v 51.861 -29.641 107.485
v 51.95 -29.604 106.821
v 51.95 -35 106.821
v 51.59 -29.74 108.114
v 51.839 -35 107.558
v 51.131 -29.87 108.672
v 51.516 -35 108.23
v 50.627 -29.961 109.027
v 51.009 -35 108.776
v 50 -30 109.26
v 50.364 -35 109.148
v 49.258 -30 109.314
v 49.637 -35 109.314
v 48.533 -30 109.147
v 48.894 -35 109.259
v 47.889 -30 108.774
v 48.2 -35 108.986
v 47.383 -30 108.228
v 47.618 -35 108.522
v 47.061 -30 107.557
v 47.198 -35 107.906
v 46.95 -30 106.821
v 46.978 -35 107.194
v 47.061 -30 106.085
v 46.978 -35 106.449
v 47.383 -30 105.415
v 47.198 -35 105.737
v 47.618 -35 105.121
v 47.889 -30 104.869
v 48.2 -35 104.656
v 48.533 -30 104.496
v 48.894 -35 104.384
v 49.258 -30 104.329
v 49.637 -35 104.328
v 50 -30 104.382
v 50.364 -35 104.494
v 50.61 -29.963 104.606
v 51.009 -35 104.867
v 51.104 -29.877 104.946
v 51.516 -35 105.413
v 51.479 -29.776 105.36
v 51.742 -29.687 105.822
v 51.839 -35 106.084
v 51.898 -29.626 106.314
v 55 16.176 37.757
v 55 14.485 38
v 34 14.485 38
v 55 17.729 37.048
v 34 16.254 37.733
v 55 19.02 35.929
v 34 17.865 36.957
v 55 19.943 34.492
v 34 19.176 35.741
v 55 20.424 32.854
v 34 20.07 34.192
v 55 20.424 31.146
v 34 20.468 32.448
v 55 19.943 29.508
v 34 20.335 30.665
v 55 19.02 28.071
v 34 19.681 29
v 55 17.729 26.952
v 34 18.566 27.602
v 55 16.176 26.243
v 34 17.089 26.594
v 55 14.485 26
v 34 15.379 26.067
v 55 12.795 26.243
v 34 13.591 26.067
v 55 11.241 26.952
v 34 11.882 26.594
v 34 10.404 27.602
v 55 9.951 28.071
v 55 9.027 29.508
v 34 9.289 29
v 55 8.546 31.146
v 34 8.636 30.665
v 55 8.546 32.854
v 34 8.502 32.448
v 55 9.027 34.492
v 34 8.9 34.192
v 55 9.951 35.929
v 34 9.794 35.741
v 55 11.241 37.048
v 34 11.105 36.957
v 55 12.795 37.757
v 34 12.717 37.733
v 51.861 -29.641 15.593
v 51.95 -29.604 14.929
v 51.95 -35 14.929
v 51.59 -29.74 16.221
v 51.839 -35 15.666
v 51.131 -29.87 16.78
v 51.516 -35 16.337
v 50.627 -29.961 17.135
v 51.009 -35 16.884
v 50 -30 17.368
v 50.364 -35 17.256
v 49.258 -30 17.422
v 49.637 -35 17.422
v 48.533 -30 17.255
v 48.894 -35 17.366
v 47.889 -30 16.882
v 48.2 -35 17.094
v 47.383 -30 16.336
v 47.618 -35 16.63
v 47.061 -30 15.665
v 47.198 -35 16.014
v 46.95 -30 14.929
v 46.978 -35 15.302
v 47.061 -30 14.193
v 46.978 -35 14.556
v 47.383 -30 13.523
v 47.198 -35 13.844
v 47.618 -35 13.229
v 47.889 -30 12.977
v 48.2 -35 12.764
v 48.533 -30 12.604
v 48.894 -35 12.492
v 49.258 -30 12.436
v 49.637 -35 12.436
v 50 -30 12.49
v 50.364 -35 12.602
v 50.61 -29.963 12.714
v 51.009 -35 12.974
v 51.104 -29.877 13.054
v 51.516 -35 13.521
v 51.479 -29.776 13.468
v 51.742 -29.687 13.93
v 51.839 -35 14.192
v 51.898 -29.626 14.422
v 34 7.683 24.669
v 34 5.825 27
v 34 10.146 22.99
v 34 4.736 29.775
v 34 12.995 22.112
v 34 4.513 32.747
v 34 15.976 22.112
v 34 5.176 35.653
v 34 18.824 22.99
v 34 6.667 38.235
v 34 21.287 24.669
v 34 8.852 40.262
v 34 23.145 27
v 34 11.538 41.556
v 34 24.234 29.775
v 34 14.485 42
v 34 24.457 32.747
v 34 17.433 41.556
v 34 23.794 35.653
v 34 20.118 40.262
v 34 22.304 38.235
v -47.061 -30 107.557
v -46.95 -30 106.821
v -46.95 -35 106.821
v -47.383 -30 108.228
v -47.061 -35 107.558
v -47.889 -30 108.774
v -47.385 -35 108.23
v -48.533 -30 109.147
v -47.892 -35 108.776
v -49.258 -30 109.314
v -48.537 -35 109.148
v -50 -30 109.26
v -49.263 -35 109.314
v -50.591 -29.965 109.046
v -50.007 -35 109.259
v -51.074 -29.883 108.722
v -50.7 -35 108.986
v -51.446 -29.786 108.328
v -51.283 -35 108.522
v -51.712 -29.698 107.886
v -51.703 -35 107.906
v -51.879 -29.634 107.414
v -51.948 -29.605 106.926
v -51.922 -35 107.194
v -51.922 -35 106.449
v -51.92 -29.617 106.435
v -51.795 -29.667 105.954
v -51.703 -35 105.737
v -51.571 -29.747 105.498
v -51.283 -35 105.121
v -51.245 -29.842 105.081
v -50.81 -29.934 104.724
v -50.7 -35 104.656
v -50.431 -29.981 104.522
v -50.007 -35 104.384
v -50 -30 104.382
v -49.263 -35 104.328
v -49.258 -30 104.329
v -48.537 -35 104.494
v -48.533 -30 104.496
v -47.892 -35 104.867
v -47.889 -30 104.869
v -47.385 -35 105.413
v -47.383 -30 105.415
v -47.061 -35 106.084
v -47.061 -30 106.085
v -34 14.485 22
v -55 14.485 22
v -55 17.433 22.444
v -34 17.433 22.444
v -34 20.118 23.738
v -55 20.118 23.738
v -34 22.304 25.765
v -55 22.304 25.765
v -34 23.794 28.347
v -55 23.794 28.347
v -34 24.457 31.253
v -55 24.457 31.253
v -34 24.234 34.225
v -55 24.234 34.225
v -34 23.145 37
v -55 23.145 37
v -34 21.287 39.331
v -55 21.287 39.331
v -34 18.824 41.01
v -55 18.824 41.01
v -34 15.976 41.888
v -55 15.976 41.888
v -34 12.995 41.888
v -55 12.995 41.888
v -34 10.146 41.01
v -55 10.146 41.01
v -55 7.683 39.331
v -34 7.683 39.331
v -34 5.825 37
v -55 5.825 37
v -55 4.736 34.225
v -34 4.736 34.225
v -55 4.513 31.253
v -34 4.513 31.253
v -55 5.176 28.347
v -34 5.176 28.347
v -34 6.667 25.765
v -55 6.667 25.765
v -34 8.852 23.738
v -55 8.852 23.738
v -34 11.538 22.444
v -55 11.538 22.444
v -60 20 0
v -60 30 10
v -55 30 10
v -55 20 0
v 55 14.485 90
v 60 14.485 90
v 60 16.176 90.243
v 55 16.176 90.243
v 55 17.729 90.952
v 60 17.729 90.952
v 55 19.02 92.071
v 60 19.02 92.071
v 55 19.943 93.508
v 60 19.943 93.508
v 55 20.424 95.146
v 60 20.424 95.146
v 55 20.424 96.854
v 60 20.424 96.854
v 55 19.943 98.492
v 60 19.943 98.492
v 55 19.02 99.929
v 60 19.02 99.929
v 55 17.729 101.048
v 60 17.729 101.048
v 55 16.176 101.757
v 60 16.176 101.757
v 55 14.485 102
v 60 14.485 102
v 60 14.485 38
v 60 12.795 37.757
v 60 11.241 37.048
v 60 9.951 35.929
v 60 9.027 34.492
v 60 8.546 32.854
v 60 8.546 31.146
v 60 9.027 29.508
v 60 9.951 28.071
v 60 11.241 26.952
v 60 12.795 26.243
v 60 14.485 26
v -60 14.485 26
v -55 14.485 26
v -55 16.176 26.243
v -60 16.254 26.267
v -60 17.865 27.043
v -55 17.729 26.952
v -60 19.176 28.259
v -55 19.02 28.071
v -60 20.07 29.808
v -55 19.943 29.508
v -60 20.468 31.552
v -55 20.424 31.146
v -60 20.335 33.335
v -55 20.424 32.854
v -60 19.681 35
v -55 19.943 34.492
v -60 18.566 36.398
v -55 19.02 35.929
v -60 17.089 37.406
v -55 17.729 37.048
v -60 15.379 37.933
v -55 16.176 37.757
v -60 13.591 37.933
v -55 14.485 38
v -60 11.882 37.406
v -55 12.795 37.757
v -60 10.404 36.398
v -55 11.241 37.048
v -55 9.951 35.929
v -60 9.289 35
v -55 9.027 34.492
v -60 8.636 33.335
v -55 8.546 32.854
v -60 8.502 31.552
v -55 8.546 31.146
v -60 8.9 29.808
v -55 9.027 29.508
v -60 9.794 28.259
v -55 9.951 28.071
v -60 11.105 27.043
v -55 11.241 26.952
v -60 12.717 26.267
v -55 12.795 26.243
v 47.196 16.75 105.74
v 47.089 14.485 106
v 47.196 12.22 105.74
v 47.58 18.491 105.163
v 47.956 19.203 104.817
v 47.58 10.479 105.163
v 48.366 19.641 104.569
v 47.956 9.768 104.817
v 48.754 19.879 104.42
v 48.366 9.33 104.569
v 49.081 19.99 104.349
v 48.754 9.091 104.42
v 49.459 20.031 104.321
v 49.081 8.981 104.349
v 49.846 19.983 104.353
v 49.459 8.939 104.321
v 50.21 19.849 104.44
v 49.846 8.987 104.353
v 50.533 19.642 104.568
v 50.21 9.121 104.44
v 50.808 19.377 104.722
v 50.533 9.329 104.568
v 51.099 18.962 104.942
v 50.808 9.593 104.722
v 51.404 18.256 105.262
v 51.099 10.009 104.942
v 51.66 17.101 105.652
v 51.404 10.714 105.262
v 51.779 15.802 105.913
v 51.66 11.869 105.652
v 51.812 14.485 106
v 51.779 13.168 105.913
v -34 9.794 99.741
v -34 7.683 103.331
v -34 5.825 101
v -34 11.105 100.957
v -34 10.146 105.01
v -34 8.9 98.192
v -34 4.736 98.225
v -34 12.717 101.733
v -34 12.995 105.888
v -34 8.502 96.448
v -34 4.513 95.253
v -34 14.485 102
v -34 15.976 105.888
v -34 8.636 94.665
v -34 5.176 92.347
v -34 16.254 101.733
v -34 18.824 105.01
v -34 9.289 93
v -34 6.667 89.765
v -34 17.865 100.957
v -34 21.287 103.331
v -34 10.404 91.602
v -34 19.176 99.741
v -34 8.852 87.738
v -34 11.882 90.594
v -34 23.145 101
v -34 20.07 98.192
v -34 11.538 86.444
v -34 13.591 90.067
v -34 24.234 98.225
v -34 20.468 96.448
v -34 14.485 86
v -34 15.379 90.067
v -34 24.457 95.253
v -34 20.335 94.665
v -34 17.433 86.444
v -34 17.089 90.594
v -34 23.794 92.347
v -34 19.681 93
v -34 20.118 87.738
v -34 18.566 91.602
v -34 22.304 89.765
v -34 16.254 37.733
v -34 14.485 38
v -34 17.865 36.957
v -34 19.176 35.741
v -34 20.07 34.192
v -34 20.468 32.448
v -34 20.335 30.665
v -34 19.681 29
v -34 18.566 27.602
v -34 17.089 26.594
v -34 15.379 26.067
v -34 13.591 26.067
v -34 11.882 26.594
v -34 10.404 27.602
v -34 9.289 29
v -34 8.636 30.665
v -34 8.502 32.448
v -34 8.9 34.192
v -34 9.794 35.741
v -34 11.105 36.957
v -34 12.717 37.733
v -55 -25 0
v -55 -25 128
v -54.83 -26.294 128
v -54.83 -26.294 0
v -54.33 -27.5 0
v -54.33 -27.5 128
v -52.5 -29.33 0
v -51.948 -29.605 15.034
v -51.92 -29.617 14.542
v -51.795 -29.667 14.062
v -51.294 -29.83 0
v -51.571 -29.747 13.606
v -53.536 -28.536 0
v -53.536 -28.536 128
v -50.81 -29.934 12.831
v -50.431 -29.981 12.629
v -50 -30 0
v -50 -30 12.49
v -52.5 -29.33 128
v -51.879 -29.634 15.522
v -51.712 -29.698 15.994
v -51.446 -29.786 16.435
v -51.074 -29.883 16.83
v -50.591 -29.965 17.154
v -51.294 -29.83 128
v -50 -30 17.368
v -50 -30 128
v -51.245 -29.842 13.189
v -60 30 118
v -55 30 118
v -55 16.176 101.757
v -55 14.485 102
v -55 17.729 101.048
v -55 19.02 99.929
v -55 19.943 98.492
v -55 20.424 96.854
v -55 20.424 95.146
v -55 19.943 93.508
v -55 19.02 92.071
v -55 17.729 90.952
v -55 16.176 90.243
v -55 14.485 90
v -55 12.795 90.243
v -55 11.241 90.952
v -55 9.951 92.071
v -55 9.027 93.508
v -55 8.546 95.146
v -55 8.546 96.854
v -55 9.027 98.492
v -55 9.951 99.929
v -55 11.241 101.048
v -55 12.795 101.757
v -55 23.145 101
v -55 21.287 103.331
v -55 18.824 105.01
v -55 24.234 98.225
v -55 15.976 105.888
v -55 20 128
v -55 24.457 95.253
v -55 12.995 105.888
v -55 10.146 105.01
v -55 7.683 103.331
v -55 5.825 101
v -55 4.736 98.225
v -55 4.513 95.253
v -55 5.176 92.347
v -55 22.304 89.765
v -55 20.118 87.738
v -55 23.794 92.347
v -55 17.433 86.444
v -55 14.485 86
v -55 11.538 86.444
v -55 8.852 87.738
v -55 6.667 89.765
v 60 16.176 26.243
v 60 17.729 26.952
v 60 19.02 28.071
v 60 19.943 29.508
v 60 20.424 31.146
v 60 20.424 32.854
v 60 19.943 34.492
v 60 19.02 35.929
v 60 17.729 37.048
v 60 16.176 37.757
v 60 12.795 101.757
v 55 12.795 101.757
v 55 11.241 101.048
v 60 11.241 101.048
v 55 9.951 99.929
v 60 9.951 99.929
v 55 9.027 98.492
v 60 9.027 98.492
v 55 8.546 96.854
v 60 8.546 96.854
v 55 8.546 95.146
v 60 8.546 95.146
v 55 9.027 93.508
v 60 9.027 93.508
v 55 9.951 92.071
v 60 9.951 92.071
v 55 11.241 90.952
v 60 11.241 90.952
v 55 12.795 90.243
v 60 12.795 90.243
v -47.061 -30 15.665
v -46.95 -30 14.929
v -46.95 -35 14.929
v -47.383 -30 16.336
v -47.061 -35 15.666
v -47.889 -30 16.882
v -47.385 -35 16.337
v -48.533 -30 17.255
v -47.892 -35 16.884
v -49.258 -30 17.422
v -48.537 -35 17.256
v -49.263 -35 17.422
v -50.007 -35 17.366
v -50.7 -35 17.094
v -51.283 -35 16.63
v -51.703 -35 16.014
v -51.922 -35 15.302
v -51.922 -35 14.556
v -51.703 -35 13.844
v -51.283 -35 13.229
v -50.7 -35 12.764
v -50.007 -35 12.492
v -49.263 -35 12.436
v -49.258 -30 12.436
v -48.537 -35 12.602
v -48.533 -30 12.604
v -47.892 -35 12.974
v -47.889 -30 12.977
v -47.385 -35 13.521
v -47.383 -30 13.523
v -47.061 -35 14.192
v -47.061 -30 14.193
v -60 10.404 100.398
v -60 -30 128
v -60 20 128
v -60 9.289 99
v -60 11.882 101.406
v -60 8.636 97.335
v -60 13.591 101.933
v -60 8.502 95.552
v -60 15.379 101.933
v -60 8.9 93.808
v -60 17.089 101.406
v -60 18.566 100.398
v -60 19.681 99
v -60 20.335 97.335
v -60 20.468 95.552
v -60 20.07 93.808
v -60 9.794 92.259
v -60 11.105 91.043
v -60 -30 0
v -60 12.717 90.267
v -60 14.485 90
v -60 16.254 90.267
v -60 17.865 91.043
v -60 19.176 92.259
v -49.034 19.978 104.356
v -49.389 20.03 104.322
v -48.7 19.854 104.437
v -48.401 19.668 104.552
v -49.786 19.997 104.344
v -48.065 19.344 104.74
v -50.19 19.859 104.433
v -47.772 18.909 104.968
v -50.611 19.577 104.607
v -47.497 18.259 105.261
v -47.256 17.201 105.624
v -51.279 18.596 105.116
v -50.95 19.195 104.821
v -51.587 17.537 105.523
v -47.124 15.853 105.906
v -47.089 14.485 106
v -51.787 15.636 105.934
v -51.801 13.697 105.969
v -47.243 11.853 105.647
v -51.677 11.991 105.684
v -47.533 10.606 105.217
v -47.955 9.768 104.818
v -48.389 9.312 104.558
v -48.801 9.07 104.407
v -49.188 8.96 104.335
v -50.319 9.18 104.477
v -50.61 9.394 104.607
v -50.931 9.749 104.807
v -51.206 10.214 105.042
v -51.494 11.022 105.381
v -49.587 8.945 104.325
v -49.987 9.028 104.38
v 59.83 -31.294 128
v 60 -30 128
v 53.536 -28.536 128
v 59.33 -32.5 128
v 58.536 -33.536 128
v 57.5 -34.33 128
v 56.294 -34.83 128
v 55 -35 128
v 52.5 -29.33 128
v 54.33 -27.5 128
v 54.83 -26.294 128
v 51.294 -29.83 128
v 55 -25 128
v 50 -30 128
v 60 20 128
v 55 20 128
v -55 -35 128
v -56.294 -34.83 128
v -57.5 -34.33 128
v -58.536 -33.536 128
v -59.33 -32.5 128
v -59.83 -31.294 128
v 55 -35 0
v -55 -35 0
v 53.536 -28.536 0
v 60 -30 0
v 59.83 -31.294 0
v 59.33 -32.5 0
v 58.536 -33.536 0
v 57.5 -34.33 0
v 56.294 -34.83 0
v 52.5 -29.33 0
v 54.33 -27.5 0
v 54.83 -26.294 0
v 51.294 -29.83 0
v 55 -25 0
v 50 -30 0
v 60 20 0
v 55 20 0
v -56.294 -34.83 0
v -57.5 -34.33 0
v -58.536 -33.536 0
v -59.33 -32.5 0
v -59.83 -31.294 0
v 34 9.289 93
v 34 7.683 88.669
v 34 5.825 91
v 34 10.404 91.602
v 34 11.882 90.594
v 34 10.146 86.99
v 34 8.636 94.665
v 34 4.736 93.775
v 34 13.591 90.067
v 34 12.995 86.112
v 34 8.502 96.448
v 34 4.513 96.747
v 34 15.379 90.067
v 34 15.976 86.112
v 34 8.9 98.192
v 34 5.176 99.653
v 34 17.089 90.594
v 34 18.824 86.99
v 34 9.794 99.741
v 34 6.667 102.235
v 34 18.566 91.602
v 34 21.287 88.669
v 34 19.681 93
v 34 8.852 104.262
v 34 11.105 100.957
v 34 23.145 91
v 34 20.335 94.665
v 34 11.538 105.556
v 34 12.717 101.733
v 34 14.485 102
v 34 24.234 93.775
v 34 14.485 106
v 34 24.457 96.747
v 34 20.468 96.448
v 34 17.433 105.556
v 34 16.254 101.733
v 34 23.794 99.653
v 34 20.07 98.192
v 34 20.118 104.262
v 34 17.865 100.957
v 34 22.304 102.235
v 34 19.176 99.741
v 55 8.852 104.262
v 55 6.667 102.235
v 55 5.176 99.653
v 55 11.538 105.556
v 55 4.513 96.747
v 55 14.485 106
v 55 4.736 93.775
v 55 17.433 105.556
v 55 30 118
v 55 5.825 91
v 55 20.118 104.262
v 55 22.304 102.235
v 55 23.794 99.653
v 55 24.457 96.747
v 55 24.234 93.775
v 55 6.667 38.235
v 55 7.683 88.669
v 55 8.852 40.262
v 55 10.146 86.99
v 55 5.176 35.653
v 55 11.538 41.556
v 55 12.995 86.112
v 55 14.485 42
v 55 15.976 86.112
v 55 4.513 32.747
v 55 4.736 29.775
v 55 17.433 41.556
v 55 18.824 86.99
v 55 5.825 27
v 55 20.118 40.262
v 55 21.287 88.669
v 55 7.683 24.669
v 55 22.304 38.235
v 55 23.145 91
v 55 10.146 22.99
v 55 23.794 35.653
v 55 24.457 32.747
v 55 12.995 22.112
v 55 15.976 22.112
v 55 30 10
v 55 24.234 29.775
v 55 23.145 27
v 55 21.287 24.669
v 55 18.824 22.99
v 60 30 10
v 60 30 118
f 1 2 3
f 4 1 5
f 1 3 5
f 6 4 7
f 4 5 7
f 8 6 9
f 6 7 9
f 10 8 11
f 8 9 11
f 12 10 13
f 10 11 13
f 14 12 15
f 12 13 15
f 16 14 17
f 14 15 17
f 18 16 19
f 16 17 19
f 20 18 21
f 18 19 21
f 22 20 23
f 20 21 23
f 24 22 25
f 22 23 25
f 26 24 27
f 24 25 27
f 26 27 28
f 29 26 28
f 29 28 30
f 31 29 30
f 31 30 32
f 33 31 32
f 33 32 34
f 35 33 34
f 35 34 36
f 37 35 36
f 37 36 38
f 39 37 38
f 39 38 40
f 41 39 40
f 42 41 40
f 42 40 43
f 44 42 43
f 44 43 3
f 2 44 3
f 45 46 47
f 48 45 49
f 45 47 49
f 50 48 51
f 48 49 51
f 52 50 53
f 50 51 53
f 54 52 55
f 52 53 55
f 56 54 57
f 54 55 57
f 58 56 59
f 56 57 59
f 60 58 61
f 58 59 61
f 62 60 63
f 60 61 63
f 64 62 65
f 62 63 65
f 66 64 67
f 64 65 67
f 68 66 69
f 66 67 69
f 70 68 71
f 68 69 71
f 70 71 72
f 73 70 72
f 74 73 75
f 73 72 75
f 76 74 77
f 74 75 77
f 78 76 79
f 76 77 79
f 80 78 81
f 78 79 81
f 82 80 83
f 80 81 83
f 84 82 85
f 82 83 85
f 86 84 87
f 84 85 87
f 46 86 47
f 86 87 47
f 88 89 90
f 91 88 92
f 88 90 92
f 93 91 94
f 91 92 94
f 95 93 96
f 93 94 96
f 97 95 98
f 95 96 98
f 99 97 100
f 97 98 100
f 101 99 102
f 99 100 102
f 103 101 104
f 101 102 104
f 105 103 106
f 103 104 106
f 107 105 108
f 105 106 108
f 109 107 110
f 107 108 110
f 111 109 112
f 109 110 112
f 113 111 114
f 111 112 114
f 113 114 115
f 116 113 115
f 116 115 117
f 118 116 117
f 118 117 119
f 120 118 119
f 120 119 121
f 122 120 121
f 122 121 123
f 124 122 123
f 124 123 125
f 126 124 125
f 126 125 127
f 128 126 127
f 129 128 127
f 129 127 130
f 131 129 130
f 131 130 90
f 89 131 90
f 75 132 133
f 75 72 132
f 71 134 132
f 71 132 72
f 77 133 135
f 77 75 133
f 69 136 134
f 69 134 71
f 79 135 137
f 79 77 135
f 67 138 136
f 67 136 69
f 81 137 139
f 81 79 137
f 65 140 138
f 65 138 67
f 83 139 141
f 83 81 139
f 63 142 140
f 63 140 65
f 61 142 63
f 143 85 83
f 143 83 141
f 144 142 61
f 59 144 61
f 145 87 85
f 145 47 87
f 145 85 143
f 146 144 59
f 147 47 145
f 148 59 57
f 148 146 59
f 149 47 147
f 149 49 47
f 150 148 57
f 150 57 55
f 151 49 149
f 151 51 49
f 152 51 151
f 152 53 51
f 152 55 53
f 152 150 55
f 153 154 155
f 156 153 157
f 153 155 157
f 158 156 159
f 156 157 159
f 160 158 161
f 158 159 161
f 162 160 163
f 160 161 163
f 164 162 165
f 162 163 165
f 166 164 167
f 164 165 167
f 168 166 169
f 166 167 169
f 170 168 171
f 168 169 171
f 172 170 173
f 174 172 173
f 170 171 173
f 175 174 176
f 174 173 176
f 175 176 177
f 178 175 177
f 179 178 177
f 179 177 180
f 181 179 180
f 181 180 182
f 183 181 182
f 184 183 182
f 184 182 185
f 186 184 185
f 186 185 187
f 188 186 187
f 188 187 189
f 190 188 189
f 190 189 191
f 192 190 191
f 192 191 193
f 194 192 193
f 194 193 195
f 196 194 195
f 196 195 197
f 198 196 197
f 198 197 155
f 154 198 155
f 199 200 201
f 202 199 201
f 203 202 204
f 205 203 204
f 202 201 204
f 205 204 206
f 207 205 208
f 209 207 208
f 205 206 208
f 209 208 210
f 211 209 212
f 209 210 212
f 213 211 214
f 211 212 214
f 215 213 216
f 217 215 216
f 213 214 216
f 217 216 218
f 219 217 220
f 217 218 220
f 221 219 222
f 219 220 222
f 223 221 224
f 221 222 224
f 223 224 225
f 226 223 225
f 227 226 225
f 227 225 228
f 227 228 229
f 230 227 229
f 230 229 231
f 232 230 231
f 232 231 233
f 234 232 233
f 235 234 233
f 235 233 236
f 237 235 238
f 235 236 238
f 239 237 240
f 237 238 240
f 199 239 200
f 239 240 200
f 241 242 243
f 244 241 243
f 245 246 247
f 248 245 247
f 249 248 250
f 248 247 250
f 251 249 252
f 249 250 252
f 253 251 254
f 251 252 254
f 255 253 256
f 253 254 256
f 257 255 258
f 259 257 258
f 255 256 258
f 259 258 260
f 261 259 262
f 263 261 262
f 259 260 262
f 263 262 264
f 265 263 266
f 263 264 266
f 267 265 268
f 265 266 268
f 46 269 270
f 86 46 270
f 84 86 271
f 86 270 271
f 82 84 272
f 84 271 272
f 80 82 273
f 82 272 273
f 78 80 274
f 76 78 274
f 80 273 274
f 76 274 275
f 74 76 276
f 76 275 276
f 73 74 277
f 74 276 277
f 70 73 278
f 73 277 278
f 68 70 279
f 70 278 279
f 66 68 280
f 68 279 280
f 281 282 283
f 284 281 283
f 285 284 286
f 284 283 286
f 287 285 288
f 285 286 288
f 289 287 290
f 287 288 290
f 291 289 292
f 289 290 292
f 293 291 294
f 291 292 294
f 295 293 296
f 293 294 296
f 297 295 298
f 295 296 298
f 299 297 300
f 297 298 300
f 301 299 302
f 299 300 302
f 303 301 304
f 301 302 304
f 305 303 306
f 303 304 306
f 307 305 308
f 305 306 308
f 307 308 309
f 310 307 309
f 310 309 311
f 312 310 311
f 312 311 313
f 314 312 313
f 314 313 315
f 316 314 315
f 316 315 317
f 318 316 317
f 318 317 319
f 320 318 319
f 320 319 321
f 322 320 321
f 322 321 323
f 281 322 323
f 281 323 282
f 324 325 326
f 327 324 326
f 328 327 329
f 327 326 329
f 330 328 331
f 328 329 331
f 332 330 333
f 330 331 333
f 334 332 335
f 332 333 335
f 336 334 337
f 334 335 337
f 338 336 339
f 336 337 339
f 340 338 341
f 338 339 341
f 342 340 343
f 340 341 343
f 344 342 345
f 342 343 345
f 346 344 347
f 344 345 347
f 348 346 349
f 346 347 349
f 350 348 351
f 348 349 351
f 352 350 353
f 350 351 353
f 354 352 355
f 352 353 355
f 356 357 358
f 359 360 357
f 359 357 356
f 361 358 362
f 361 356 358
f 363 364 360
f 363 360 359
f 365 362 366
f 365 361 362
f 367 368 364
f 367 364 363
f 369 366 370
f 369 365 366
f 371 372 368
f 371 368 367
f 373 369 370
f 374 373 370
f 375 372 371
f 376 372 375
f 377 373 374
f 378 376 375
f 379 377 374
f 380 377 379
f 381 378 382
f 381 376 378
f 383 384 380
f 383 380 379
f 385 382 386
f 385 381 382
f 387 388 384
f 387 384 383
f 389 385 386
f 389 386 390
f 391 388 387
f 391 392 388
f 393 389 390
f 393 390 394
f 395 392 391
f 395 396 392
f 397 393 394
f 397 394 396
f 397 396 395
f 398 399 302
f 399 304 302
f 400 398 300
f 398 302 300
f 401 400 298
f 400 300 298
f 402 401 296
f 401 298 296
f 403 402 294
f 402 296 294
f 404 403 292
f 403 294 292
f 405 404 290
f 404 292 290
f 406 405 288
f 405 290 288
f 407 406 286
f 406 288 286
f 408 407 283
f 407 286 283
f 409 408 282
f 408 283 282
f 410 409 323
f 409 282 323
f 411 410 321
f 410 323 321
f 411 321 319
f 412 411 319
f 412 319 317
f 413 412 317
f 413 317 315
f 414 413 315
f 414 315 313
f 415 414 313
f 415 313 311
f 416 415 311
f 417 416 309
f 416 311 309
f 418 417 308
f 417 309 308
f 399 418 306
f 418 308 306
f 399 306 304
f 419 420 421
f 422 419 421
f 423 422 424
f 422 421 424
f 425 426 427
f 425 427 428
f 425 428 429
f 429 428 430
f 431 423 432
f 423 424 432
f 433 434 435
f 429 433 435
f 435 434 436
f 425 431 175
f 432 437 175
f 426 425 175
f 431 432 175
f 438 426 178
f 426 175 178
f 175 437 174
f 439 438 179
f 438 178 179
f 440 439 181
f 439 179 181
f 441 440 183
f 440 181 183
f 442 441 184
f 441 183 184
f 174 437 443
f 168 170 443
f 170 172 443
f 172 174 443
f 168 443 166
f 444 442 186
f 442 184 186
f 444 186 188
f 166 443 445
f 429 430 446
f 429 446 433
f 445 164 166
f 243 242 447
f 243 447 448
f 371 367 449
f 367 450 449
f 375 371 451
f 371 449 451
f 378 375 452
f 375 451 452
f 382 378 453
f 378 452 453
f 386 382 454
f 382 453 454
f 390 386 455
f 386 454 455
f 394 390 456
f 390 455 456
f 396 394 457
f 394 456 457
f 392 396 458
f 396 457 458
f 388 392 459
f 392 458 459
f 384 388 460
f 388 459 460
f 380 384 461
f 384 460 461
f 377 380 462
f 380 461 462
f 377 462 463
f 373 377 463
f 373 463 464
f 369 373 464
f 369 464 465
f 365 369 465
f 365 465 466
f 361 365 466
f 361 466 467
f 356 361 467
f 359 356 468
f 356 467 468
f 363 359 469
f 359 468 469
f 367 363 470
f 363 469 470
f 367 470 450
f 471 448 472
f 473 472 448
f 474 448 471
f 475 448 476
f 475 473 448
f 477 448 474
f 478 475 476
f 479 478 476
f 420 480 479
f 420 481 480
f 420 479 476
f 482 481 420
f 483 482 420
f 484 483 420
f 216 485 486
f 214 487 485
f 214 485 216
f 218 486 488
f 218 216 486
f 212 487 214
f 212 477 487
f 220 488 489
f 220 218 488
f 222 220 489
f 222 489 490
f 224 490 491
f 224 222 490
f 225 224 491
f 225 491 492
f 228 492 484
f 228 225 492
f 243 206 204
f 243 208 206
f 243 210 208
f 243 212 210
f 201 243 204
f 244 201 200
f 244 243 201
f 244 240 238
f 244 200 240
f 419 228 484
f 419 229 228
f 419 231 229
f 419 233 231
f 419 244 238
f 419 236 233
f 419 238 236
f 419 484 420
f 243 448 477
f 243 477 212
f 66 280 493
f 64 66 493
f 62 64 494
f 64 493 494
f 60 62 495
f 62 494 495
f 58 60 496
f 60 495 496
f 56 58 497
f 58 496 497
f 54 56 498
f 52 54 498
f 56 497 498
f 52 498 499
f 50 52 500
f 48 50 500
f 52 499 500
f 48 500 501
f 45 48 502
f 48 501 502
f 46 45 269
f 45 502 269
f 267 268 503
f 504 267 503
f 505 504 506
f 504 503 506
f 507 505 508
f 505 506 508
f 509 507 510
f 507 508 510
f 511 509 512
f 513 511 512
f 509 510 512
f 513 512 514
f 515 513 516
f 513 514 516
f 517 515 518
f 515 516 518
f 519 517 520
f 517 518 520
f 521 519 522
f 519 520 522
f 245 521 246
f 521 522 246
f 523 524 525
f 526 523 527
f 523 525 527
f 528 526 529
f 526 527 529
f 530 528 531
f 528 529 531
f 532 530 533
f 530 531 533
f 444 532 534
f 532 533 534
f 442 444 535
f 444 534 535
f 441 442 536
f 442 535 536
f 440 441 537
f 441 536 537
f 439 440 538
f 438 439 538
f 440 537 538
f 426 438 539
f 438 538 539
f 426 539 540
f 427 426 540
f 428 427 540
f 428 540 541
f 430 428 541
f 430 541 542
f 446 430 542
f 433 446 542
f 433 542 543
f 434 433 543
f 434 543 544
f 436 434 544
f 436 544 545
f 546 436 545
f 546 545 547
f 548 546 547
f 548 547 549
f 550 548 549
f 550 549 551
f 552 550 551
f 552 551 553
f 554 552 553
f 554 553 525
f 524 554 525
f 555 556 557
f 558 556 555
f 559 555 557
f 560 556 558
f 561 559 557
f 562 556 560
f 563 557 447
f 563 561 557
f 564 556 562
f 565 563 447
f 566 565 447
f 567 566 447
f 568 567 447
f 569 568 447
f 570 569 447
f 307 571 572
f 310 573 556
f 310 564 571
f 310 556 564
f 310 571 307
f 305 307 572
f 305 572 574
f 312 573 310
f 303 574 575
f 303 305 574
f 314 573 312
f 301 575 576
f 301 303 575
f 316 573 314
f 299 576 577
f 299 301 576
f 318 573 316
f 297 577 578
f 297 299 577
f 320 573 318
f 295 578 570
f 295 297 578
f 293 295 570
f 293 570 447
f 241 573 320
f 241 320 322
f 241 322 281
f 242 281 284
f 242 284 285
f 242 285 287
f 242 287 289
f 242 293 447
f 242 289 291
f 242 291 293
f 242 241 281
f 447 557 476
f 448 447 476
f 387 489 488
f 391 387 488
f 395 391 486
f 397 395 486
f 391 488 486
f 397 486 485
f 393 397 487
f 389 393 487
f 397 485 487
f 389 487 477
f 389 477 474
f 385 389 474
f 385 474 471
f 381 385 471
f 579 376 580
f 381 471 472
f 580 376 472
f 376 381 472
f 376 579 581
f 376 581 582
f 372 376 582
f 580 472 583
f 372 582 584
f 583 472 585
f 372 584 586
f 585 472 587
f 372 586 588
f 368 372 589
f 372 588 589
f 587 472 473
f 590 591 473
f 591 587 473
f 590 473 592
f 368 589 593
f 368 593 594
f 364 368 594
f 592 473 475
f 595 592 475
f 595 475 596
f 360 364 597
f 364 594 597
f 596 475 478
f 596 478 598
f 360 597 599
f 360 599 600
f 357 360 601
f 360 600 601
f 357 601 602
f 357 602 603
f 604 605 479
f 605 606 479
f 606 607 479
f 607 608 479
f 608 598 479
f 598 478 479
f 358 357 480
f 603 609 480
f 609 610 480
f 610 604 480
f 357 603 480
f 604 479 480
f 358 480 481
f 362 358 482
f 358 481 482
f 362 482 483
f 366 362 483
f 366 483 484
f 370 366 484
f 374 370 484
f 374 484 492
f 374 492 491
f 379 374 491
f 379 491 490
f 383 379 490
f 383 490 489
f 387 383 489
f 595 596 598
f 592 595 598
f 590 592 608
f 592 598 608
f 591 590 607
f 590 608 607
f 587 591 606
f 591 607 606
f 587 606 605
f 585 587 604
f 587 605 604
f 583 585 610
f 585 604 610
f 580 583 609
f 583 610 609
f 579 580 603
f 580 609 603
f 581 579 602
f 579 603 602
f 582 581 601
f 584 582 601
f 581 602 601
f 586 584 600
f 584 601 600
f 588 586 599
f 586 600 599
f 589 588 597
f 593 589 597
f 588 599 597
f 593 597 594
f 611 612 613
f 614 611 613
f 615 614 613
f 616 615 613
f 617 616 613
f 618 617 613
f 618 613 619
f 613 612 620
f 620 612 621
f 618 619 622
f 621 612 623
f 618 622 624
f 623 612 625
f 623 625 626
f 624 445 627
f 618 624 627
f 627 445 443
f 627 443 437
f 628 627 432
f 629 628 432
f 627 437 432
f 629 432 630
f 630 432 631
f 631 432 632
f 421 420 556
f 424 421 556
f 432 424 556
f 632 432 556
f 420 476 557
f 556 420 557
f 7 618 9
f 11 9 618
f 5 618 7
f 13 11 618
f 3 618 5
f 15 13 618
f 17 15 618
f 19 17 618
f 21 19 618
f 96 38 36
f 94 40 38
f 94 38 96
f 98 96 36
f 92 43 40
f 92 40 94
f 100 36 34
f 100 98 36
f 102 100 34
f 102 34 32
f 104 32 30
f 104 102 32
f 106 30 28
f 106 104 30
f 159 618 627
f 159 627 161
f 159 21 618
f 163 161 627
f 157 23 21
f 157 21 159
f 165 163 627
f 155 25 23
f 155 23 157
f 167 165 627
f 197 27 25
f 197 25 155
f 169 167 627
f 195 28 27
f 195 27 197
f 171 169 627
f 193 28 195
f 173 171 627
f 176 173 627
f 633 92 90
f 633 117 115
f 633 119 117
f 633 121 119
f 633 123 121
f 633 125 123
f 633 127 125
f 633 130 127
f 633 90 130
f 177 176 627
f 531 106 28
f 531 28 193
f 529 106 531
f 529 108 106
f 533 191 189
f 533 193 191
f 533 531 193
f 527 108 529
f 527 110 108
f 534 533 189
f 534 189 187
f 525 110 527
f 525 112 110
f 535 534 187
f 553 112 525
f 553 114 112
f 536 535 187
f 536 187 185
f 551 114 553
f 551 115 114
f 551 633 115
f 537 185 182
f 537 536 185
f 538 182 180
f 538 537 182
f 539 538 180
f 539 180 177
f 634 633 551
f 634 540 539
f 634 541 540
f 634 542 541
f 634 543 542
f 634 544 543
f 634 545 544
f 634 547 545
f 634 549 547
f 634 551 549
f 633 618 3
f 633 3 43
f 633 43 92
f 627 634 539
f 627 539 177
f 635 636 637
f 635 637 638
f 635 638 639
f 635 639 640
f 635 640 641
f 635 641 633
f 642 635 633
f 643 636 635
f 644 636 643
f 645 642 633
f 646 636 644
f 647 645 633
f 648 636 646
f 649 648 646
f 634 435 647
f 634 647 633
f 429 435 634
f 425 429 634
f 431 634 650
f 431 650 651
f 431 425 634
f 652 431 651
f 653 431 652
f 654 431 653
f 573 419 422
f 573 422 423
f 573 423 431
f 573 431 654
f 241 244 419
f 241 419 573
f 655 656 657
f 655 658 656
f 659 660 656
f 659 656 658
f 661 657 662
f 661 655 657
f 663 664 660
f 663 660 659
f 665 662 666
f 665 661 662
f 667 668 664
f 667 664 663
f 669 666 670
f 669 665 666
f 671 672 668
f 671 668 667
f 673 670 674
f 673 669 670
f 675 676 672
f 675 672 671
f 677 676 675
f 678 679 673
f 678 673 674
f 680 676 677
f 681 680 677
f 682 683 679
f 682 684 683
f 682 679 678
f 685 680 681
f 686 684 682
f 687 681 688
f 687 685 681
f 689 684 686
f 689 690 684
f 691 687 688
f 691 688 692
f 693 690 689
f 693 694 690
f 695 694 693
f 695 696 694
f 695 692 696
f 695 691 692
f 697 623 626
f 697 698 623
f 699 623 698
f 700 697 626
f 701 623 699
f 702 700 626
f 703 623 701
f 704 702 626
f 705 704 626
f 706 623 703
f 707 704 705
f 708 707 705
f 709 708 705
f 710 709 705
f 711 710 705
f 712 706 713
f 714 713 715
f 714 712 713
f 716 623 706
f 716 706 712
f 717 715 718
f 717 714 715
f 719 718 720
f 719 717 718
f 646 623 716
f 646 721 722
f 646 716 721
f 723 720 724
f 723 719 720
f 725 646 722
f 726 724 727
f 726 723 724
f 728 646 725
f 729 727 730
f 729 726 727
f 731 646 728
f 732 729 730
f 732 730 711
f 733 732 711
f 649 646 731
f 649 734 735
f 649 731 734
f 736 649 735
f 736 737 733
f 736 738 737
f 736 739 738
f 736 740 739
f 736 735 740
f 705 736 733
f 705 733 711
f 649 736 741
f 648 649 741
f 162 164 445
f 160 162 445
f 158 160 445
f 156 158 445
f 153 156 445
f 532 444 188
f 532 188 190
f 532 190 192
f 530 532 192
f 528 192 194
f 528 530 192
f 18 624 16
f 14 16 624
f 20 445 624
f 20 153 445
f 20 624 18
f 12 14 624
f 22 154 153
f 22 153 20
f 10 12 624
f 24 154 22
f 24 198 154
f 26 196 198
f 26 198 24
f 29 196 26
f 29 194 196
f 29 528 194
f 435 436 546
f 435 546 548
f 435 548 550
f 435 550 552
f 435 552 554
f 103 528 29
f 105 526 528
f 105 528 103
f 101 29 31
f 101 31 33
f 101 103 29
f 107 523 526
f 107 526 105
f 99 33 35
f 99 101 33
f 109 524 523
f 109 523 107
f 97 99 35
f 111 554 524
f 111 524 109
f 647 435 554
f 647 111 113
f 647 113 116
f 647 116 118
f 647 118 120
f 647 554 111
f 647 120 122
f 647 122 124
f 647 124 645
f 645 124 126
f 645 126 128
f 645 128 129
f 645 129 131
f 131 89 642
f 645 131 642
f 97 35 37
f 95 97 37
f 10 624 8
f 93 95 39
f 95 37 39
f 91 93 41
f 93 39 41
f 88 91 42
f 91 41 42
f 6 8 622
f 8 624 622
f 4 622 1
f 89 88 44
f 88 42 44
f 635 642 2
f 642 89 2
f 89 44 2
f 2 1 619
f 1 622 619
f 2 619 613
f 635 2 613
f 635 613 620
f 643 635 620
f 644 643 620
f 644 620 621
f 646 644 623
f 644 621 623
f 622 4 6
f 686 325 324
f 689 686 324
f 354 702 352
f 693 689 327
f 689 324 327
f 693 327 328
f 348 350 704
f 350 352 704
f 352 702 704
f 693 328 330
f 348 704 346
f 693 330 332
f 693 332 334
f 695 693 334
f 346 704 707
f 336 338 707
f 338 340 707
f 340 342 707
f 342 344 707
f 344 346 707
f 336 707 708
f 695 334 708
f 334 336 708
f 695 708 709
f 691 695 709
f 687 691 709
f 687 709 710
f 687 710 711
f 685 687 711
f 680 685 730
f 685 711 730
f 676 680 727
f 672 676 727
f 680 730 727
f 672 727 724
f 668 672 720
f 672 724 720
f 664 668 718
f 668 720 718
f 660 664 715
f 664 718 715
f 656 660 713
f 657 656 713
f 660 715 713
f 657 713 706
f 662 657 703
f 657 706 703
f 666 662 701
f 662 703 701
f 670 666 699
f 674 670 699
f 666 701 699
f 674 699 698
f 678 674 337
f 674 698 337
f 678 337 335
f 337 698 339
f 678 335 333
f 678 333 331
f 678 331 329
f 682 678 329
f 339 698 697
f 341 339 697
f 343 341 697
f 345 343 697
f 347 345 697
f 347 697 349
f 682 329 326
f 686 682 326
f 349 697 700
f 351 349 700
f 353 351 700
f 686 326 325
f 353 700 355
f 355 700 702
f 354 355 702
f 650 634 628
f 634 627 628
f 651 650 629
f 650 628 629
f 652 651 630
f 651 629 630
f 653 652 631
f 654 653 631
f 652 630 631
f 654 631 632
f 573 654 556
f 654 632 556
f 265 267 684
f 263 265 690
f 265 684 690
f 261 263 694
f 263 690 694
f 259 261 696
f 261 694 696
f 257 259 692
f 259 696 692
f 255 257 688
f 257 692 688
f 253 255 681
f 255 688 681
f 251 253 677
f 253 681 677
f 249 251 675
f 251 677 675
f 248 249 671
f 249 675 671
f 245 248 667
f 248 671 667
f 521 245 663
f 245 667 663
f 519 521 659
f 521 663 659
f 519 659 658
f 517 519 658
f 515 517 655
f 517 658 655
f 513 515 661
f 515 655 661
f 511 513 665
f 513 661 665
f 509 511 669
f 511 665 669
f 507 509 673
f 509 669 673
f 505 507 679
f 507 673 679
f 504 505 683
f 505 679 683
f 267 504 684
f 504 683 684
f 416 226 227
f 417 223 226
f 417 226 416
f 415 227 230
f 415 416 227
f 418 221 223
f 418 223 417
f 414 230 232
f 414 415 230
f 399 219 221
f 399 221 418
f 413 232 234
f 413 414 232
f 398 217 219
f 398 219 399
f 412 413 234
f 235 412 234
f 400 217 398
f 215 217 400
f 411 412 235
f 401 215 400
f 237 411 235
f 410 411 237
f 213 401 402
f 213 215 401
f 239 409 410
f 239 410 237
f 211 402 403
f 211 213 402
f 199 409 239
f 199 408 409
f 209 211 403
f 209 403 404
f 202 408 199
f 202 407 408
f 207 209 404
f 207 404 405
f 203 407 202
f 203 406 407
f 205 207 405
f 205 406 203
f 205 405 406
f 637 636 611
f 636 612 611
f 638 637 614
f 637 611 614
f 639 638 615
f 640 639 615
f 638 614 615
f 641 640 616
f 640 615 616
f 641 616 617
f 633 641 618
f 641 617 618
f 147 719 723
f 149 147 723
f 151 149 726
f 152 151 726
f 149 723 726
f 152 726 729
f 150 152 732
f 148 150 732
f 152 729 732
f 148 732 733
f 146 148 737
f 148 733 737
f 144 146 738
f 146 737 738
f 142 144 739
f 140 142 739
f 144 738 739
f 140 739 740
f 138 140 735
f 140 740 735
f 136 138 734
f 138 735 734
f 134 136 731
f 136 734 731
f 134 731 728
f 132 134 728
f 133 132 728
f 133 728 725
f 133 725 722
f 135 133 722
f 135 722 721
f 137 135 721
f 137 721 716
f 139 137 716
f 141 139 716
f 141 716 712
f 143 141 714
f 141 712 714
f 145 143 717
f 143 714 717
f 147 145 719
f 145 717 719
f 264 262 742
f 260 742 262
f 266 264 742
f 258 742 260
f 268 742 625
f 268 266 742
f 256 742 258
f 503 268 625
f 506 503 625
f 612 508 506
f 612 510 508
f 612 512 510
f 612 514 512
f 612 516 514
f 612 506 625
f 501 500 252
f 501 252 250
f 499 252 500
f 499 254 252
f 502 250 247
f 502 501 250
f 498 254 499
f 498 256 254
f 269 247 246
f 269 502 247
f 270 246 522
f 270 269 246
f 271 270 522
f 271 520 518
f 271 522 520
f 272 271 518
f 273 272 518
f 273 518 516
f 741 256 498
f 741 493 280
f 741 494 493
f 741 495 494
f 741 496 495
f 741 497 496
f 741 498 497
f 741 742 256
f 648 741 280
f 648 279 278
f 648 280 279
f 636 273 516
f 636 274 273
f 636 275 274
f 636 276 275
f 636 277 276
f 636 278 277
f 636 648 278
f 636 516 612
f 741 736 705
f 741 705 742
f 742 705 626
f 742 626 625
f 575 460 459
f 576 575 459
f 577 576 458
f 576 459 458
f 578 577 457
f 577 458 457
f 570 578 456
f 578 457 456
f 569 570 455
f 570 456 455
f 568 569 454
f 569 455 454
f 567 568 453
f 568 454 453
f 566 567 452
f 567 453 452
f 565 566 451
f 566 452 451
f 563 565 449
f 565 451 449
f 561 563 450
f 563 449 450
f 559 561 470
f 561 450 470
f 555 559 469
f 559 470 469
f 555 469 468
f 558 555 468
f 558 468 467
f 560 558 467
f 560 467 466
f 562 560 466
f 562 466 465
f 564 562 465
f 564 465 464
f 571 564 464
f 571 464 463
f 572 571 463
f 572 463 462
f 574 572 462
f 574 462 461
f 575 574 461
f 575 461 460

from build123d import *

# Parameters (mm, degrees)
BOSS_EXTRUDE1_DEPTH     = 128
FILLET1_R               = 5
CHAMFER1_SIZE           = 10
SKETCH3_R               = 6
CUT_EXTRUDE1_DEPTH      = 121
SKETCH5_R               = 10
BOSS_EXTRUDE2_DEPTH     = 21
SKETCH6_R               = 10
BOSS_EXTRUDE3_DEPTH     = 21
SKETCH7_R               = 6
CUT_EXTRUDE2_DEPTH      = 6
CUT_EXTRUDE2_DEPTH_BACK = 116
SKETCH8_R               = 2.5
CUT_EXTRUDE3_DEPTH      = 66


with BuildPart() as part:
    # Sketch2 → Boss-Extrude1 (new body)
    with BuildSketch(Plane.XY):
        Polygon((-55, 30), (-55, -30), (55, -30), (55, 30), (60, 30), (60, -35), (-60, -35), (-60, 30), align=None)
    extrude(amount=BOSS_EXTRUDE1_DEPTH)

    # Fillet1
    fillet1_edges = [part.edges().sort_by_distance(p)[0] for p in [
        (60, -35, 64),
        (-60, -35, 64),
        (-55, -30, 64),
        (55, -30, 64),
    ]]
    fillet(fillet1_edges, radius=FILLET1_R)

    # Chamfer1
    chamfer1_edges = [part.edges().sort_by_distance(p)[0] for p in [
        (-57.5, 30, 128),
        (57.5, 30, 128),
        (57.5, 30, 0),
        (-57.5, 30, 0),
    ]]
    chamfer(chamfer1_edges, length=CHAMFER1_SIZE)

    # Sketch3 → Cut-Extrude1 (cut, through all)
    with BuildSketch(Plane(origin=(60, 0, 0), x_dir=(0, 0, -1), z_dir=(1, 0, 0))):
        with Locations((-96, 14.48521638)):
            Circle(SKETCH3_R)
        with Locations((-32, 14.48521638)):
            Circle(SKETCH3_R)
    extrude(amount=-CUT_EXTRUDE1_DEPTH, mode=Mode.SUBTRACT)

    # Sketch5 → Boss-Extrude2 (add)
    with BuildSketch(Plane.ZY.offset(-55)):
        with Locations((32, 14.48521638)):
            Circle(SKETCH5_R)
        with Locations((96, 14.48521638)):
            Circle(SKETCH5_R)
    extrude(amount=BOSS_EXTRUDE2_DEPTH)

    # Sketch6 → Boss-Extrude3 (add)
    with BuildSketch(Plane(origin=(-55, 0, 0), x_dir=(0, 0, -1), z_dir=(1, 0, 0))):
        with Locations((-32, 14.48521638)):
            Circle(SKETCH6_R)
        with Locations((-96, 14.48521638)):
            Circle(SKETCH6_R)
    extrude(amount=BOSS_EXTRUDE3_DEPTH)

    # Sketch7 → Cut-Extrude2 (cut, two sides)
    with BuildSketch(Plane.ZY.offset(55)) as cut_extrude2_sk:
        with Locations((32, 14.48521638)):
            Circle(SKETCH7_R)
        with Locations((96, 14.48521638)):
            Circle(SKETCH7_R)
    extrude(amount=CUT_EXTRUDE2_DEPTH, mode=Mode.SUBTRACT)
    extrude(cut_extrude2_sk.sketch, amount=-CUT_EXTRUDE2_DEPTH_BACK, mode=Mode.SUBTRACT)

    # Sketch8 → Cut-Extrude3 (cut, through all)
    with BuildSketch(Plane.XZ.offset(35)):
        with Locations((49.450316968, 14.929077734)):
            Circle(SKETCH8_R)
        with Locations((-49.450316968, 14.929077734)):
            Circle(SKETCH8_R)
        with Locations((-49.450316968, 106.821296535)):
            Circle(SKETCH8_R)
        with Locations((49.450316968, 106.821296535)):
            Circle(SKETCH8_R)
    extrude(amount=-CUT_EXTRUDE3_DEPTH, mode=Mode.SUBTRACT)


solid = part.part
